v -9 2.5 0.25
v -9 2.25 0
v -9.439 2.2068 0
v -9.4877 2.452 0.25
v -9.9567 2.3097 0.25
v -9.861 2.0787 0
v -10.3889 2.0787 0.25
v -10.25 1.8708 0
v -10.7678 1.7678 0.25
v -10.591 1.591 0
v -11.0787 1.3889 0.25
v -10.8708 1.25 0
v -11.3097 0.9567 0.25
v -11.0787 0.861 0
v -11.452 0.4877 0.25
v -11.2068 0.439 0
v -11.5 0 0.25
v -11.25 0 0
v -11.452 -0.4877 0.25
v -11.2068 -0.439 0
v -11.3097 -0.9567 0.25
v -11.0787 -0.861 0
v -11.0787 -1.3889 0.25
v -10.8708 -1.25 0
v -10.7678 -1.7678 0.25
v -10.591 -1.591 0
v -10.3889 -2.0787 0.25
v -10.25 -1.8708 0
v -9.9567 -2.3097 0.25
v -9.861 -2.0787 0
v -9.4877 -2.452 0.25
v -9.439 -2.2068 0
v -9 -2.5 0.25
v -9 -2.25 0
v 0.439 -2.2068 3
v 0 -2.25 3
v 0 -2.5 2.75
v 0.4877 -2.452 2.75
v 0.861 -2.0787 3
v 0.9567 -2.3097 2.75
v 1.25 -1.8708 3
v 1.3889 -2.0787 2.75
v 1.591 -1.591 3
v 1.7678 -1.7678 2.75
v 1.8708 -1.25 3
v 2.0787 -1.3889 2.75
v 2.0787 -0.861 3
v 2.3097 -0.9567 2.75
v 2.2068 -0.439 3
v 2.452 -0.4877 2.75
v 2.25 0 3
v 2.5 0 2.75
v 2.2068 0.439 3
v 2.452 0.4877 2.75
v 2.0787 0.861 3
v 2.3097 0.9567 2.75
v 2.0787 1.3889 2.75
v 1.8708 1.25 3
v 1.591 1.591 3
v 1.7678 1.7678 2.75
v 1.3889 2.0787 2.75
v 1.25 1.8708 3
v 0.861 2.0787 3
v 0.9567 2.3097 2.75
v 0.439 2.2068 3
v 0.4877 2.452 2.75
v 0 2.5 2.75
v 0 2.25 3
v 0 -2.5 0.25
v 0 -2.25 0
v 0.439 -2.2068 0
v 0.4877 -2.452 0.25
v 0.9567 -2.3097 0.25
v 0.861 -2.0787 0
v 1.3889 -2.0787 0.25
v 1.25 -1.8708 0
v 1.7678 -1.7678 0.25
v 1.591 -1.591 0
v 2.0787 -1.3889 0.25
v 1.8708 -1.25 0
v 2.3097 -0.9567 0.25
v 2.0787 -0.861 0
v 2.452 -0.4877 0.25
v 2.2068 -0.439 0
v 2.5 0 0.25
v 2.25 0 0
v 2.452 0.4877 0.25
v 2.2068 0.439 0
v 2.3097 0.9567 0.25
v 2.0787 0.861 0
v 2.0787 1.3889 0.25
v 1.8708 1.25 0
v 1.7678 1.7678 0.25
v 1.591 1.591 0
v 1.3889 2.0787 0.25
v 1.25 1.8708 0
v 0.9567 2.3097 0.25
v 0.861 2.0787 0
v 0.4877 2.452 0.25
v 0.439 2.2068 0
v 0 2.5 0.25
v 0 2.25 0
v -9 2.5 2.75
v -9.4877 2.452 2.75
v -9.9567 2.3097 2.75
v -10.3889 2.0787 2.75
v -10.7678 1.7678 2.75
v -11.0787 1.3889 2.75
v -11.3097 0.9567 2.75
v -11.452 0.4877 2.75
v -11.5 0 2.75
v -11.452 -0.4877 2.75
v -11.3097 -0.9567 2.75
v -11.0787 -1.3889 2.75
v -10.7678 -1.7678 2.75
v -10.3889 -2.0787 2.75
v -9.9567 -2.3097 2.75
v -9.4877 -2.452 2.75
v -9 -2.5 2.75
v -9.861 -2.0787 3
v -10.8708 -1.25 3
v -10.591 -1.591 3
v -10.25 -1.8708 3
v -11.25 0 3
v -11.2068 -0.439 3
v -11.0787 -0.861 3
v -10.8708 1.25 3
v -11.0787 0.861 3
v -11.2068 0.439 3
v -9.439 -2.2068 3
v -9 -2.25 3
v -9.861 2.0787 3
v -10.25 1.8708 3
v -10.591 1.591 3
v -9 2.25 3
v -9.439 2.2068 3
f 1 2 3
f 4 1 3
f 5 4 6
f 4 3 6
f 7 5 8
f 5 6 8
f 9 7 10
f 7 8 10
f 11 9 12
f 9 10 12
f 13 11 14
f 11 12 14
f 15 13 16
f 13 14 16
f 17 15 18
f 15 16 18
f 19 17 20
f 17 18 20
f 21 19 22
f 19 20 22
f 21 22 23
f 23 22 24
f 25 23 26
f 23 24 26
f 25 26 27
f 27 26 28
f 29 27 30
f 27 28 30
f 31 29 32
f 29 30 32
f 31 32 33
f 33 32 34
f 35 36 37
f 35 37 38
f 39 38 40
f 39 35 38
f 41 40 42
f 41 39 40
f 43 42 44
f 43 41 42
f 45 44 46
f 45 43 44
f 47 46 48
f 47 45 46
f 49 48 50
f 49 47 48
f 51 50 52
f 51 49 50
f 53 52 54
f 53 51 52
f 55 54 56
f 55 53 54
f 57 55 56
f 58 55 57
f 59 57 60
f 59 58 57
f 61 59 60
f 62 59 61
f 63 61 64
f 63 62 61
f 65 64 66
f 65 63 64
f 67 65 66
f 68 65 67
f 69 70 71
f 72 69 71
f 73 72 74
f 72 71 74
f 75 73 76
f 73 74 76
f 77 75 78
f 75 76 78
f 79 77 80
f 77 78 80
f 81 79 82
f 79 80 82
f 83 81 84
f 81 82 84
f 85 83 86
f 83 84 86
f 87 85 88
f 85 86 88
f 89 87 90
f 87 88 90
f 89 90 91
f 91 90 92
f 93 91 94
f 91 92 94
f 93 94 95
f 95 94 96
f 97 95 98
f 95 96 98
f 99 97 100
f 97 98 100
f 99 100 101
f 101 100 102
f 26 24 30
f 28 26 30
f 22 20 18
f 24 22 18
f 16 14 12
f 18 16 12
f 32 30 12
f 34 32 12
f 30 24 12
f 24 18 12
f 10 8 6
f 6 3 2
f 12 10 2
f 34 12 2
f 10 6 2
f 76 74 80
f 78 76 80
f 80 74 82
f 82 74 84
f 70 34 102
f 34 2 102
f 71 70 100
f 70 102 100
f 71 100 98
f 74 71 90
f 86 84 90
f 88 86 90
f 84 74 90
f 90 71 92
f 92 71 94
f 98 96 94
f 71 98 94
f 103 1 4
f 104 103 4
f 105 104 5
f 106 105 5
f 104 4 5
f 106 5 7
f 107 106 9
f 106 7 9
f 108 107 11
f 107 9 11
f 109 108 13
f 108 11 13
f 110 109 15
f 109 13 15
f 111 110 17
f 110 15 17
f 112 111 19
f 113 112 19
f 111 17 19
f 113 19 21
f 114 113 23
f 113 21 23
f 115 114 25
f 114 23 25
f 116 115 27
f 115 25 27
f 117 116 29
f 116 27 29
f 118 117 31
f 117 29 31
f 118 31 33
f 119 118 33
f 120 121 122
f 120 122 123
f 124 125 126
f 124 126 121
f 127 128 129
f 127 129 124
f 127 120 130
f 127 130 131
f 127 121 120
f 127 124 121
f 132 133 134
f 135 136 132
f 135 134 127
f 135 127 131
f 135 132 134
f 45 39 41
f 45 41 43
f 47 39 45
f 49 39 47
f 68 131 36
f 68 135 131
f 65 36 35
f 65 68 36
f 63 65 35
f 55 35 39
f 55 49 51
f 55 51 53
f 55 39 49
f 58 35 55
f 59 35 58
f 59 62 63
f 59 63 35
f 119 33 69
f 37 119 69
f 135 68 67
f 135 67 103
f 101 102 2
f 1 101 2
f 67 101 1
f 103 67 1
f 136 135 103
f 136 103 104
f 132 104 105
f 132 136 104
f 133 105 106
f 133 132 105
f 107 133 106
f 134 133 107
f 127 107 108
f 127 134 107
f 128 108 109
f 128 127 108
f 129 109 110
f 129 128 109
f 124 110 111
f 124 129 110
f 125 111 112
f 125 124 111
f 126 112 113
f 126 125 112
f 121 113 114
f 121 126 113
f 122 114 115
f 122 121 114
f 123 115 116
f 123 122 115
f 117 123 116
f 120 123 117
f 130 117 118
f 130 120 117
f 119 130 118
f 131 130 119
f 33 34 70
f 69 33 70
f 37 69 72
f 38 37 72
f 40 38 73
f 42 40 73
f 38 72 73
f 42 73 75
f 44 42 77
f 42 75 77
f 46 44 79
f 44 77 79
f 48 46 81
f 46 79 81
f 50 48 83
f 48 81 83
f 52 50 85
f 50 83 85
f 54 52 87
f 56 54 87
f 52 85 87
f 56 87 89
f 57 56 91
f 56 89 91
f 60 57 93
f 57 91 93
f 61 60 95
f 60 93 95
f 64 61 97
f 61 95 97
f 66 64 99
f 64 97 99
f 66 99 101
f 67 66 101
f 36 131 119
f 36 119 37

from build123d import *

# Parameters (mm, degrees)
EXTRUDE1_DEPTH = 3
CHAMFER1_SIZE  = 0.25


with BuildPart() as part:
    # Sketch1 → Extrude1 (new body)
    with BuildSketch(Plane.XY):
        with BuildLine():
            Line((0, 2.5), (-9, 2.5))
            ThreePointArc((-9, 2.5), (-11.5, 0), (-9, -2.5))
            Line((-9, -2.5), (0, -2.5))
            ThreePointArc((0, -2.5), (2.5, 0), (0, 2.5))
        make_face()
    extrude(amount=EXTRUDE1_DEPTH)

    # Chamfer1
    chamfer1_edges = [part.edges().sort_by_distance(p)[0] for p in [
        (-11.5, 0, 3),
        (-4.5, -2.5, 3),
        (2.5, 0, 3),
        (-4.5, -2.5, 0),
        (-11.5, 0, 0),
        (-4.5, 2.5, 0),
        (2.5, 0, 0),
        (-4.5, 2.5, 3),
    ]]
    chamfer(chamfer1_edges, length=CHAMFER1_SIZE)


solid = part.part
